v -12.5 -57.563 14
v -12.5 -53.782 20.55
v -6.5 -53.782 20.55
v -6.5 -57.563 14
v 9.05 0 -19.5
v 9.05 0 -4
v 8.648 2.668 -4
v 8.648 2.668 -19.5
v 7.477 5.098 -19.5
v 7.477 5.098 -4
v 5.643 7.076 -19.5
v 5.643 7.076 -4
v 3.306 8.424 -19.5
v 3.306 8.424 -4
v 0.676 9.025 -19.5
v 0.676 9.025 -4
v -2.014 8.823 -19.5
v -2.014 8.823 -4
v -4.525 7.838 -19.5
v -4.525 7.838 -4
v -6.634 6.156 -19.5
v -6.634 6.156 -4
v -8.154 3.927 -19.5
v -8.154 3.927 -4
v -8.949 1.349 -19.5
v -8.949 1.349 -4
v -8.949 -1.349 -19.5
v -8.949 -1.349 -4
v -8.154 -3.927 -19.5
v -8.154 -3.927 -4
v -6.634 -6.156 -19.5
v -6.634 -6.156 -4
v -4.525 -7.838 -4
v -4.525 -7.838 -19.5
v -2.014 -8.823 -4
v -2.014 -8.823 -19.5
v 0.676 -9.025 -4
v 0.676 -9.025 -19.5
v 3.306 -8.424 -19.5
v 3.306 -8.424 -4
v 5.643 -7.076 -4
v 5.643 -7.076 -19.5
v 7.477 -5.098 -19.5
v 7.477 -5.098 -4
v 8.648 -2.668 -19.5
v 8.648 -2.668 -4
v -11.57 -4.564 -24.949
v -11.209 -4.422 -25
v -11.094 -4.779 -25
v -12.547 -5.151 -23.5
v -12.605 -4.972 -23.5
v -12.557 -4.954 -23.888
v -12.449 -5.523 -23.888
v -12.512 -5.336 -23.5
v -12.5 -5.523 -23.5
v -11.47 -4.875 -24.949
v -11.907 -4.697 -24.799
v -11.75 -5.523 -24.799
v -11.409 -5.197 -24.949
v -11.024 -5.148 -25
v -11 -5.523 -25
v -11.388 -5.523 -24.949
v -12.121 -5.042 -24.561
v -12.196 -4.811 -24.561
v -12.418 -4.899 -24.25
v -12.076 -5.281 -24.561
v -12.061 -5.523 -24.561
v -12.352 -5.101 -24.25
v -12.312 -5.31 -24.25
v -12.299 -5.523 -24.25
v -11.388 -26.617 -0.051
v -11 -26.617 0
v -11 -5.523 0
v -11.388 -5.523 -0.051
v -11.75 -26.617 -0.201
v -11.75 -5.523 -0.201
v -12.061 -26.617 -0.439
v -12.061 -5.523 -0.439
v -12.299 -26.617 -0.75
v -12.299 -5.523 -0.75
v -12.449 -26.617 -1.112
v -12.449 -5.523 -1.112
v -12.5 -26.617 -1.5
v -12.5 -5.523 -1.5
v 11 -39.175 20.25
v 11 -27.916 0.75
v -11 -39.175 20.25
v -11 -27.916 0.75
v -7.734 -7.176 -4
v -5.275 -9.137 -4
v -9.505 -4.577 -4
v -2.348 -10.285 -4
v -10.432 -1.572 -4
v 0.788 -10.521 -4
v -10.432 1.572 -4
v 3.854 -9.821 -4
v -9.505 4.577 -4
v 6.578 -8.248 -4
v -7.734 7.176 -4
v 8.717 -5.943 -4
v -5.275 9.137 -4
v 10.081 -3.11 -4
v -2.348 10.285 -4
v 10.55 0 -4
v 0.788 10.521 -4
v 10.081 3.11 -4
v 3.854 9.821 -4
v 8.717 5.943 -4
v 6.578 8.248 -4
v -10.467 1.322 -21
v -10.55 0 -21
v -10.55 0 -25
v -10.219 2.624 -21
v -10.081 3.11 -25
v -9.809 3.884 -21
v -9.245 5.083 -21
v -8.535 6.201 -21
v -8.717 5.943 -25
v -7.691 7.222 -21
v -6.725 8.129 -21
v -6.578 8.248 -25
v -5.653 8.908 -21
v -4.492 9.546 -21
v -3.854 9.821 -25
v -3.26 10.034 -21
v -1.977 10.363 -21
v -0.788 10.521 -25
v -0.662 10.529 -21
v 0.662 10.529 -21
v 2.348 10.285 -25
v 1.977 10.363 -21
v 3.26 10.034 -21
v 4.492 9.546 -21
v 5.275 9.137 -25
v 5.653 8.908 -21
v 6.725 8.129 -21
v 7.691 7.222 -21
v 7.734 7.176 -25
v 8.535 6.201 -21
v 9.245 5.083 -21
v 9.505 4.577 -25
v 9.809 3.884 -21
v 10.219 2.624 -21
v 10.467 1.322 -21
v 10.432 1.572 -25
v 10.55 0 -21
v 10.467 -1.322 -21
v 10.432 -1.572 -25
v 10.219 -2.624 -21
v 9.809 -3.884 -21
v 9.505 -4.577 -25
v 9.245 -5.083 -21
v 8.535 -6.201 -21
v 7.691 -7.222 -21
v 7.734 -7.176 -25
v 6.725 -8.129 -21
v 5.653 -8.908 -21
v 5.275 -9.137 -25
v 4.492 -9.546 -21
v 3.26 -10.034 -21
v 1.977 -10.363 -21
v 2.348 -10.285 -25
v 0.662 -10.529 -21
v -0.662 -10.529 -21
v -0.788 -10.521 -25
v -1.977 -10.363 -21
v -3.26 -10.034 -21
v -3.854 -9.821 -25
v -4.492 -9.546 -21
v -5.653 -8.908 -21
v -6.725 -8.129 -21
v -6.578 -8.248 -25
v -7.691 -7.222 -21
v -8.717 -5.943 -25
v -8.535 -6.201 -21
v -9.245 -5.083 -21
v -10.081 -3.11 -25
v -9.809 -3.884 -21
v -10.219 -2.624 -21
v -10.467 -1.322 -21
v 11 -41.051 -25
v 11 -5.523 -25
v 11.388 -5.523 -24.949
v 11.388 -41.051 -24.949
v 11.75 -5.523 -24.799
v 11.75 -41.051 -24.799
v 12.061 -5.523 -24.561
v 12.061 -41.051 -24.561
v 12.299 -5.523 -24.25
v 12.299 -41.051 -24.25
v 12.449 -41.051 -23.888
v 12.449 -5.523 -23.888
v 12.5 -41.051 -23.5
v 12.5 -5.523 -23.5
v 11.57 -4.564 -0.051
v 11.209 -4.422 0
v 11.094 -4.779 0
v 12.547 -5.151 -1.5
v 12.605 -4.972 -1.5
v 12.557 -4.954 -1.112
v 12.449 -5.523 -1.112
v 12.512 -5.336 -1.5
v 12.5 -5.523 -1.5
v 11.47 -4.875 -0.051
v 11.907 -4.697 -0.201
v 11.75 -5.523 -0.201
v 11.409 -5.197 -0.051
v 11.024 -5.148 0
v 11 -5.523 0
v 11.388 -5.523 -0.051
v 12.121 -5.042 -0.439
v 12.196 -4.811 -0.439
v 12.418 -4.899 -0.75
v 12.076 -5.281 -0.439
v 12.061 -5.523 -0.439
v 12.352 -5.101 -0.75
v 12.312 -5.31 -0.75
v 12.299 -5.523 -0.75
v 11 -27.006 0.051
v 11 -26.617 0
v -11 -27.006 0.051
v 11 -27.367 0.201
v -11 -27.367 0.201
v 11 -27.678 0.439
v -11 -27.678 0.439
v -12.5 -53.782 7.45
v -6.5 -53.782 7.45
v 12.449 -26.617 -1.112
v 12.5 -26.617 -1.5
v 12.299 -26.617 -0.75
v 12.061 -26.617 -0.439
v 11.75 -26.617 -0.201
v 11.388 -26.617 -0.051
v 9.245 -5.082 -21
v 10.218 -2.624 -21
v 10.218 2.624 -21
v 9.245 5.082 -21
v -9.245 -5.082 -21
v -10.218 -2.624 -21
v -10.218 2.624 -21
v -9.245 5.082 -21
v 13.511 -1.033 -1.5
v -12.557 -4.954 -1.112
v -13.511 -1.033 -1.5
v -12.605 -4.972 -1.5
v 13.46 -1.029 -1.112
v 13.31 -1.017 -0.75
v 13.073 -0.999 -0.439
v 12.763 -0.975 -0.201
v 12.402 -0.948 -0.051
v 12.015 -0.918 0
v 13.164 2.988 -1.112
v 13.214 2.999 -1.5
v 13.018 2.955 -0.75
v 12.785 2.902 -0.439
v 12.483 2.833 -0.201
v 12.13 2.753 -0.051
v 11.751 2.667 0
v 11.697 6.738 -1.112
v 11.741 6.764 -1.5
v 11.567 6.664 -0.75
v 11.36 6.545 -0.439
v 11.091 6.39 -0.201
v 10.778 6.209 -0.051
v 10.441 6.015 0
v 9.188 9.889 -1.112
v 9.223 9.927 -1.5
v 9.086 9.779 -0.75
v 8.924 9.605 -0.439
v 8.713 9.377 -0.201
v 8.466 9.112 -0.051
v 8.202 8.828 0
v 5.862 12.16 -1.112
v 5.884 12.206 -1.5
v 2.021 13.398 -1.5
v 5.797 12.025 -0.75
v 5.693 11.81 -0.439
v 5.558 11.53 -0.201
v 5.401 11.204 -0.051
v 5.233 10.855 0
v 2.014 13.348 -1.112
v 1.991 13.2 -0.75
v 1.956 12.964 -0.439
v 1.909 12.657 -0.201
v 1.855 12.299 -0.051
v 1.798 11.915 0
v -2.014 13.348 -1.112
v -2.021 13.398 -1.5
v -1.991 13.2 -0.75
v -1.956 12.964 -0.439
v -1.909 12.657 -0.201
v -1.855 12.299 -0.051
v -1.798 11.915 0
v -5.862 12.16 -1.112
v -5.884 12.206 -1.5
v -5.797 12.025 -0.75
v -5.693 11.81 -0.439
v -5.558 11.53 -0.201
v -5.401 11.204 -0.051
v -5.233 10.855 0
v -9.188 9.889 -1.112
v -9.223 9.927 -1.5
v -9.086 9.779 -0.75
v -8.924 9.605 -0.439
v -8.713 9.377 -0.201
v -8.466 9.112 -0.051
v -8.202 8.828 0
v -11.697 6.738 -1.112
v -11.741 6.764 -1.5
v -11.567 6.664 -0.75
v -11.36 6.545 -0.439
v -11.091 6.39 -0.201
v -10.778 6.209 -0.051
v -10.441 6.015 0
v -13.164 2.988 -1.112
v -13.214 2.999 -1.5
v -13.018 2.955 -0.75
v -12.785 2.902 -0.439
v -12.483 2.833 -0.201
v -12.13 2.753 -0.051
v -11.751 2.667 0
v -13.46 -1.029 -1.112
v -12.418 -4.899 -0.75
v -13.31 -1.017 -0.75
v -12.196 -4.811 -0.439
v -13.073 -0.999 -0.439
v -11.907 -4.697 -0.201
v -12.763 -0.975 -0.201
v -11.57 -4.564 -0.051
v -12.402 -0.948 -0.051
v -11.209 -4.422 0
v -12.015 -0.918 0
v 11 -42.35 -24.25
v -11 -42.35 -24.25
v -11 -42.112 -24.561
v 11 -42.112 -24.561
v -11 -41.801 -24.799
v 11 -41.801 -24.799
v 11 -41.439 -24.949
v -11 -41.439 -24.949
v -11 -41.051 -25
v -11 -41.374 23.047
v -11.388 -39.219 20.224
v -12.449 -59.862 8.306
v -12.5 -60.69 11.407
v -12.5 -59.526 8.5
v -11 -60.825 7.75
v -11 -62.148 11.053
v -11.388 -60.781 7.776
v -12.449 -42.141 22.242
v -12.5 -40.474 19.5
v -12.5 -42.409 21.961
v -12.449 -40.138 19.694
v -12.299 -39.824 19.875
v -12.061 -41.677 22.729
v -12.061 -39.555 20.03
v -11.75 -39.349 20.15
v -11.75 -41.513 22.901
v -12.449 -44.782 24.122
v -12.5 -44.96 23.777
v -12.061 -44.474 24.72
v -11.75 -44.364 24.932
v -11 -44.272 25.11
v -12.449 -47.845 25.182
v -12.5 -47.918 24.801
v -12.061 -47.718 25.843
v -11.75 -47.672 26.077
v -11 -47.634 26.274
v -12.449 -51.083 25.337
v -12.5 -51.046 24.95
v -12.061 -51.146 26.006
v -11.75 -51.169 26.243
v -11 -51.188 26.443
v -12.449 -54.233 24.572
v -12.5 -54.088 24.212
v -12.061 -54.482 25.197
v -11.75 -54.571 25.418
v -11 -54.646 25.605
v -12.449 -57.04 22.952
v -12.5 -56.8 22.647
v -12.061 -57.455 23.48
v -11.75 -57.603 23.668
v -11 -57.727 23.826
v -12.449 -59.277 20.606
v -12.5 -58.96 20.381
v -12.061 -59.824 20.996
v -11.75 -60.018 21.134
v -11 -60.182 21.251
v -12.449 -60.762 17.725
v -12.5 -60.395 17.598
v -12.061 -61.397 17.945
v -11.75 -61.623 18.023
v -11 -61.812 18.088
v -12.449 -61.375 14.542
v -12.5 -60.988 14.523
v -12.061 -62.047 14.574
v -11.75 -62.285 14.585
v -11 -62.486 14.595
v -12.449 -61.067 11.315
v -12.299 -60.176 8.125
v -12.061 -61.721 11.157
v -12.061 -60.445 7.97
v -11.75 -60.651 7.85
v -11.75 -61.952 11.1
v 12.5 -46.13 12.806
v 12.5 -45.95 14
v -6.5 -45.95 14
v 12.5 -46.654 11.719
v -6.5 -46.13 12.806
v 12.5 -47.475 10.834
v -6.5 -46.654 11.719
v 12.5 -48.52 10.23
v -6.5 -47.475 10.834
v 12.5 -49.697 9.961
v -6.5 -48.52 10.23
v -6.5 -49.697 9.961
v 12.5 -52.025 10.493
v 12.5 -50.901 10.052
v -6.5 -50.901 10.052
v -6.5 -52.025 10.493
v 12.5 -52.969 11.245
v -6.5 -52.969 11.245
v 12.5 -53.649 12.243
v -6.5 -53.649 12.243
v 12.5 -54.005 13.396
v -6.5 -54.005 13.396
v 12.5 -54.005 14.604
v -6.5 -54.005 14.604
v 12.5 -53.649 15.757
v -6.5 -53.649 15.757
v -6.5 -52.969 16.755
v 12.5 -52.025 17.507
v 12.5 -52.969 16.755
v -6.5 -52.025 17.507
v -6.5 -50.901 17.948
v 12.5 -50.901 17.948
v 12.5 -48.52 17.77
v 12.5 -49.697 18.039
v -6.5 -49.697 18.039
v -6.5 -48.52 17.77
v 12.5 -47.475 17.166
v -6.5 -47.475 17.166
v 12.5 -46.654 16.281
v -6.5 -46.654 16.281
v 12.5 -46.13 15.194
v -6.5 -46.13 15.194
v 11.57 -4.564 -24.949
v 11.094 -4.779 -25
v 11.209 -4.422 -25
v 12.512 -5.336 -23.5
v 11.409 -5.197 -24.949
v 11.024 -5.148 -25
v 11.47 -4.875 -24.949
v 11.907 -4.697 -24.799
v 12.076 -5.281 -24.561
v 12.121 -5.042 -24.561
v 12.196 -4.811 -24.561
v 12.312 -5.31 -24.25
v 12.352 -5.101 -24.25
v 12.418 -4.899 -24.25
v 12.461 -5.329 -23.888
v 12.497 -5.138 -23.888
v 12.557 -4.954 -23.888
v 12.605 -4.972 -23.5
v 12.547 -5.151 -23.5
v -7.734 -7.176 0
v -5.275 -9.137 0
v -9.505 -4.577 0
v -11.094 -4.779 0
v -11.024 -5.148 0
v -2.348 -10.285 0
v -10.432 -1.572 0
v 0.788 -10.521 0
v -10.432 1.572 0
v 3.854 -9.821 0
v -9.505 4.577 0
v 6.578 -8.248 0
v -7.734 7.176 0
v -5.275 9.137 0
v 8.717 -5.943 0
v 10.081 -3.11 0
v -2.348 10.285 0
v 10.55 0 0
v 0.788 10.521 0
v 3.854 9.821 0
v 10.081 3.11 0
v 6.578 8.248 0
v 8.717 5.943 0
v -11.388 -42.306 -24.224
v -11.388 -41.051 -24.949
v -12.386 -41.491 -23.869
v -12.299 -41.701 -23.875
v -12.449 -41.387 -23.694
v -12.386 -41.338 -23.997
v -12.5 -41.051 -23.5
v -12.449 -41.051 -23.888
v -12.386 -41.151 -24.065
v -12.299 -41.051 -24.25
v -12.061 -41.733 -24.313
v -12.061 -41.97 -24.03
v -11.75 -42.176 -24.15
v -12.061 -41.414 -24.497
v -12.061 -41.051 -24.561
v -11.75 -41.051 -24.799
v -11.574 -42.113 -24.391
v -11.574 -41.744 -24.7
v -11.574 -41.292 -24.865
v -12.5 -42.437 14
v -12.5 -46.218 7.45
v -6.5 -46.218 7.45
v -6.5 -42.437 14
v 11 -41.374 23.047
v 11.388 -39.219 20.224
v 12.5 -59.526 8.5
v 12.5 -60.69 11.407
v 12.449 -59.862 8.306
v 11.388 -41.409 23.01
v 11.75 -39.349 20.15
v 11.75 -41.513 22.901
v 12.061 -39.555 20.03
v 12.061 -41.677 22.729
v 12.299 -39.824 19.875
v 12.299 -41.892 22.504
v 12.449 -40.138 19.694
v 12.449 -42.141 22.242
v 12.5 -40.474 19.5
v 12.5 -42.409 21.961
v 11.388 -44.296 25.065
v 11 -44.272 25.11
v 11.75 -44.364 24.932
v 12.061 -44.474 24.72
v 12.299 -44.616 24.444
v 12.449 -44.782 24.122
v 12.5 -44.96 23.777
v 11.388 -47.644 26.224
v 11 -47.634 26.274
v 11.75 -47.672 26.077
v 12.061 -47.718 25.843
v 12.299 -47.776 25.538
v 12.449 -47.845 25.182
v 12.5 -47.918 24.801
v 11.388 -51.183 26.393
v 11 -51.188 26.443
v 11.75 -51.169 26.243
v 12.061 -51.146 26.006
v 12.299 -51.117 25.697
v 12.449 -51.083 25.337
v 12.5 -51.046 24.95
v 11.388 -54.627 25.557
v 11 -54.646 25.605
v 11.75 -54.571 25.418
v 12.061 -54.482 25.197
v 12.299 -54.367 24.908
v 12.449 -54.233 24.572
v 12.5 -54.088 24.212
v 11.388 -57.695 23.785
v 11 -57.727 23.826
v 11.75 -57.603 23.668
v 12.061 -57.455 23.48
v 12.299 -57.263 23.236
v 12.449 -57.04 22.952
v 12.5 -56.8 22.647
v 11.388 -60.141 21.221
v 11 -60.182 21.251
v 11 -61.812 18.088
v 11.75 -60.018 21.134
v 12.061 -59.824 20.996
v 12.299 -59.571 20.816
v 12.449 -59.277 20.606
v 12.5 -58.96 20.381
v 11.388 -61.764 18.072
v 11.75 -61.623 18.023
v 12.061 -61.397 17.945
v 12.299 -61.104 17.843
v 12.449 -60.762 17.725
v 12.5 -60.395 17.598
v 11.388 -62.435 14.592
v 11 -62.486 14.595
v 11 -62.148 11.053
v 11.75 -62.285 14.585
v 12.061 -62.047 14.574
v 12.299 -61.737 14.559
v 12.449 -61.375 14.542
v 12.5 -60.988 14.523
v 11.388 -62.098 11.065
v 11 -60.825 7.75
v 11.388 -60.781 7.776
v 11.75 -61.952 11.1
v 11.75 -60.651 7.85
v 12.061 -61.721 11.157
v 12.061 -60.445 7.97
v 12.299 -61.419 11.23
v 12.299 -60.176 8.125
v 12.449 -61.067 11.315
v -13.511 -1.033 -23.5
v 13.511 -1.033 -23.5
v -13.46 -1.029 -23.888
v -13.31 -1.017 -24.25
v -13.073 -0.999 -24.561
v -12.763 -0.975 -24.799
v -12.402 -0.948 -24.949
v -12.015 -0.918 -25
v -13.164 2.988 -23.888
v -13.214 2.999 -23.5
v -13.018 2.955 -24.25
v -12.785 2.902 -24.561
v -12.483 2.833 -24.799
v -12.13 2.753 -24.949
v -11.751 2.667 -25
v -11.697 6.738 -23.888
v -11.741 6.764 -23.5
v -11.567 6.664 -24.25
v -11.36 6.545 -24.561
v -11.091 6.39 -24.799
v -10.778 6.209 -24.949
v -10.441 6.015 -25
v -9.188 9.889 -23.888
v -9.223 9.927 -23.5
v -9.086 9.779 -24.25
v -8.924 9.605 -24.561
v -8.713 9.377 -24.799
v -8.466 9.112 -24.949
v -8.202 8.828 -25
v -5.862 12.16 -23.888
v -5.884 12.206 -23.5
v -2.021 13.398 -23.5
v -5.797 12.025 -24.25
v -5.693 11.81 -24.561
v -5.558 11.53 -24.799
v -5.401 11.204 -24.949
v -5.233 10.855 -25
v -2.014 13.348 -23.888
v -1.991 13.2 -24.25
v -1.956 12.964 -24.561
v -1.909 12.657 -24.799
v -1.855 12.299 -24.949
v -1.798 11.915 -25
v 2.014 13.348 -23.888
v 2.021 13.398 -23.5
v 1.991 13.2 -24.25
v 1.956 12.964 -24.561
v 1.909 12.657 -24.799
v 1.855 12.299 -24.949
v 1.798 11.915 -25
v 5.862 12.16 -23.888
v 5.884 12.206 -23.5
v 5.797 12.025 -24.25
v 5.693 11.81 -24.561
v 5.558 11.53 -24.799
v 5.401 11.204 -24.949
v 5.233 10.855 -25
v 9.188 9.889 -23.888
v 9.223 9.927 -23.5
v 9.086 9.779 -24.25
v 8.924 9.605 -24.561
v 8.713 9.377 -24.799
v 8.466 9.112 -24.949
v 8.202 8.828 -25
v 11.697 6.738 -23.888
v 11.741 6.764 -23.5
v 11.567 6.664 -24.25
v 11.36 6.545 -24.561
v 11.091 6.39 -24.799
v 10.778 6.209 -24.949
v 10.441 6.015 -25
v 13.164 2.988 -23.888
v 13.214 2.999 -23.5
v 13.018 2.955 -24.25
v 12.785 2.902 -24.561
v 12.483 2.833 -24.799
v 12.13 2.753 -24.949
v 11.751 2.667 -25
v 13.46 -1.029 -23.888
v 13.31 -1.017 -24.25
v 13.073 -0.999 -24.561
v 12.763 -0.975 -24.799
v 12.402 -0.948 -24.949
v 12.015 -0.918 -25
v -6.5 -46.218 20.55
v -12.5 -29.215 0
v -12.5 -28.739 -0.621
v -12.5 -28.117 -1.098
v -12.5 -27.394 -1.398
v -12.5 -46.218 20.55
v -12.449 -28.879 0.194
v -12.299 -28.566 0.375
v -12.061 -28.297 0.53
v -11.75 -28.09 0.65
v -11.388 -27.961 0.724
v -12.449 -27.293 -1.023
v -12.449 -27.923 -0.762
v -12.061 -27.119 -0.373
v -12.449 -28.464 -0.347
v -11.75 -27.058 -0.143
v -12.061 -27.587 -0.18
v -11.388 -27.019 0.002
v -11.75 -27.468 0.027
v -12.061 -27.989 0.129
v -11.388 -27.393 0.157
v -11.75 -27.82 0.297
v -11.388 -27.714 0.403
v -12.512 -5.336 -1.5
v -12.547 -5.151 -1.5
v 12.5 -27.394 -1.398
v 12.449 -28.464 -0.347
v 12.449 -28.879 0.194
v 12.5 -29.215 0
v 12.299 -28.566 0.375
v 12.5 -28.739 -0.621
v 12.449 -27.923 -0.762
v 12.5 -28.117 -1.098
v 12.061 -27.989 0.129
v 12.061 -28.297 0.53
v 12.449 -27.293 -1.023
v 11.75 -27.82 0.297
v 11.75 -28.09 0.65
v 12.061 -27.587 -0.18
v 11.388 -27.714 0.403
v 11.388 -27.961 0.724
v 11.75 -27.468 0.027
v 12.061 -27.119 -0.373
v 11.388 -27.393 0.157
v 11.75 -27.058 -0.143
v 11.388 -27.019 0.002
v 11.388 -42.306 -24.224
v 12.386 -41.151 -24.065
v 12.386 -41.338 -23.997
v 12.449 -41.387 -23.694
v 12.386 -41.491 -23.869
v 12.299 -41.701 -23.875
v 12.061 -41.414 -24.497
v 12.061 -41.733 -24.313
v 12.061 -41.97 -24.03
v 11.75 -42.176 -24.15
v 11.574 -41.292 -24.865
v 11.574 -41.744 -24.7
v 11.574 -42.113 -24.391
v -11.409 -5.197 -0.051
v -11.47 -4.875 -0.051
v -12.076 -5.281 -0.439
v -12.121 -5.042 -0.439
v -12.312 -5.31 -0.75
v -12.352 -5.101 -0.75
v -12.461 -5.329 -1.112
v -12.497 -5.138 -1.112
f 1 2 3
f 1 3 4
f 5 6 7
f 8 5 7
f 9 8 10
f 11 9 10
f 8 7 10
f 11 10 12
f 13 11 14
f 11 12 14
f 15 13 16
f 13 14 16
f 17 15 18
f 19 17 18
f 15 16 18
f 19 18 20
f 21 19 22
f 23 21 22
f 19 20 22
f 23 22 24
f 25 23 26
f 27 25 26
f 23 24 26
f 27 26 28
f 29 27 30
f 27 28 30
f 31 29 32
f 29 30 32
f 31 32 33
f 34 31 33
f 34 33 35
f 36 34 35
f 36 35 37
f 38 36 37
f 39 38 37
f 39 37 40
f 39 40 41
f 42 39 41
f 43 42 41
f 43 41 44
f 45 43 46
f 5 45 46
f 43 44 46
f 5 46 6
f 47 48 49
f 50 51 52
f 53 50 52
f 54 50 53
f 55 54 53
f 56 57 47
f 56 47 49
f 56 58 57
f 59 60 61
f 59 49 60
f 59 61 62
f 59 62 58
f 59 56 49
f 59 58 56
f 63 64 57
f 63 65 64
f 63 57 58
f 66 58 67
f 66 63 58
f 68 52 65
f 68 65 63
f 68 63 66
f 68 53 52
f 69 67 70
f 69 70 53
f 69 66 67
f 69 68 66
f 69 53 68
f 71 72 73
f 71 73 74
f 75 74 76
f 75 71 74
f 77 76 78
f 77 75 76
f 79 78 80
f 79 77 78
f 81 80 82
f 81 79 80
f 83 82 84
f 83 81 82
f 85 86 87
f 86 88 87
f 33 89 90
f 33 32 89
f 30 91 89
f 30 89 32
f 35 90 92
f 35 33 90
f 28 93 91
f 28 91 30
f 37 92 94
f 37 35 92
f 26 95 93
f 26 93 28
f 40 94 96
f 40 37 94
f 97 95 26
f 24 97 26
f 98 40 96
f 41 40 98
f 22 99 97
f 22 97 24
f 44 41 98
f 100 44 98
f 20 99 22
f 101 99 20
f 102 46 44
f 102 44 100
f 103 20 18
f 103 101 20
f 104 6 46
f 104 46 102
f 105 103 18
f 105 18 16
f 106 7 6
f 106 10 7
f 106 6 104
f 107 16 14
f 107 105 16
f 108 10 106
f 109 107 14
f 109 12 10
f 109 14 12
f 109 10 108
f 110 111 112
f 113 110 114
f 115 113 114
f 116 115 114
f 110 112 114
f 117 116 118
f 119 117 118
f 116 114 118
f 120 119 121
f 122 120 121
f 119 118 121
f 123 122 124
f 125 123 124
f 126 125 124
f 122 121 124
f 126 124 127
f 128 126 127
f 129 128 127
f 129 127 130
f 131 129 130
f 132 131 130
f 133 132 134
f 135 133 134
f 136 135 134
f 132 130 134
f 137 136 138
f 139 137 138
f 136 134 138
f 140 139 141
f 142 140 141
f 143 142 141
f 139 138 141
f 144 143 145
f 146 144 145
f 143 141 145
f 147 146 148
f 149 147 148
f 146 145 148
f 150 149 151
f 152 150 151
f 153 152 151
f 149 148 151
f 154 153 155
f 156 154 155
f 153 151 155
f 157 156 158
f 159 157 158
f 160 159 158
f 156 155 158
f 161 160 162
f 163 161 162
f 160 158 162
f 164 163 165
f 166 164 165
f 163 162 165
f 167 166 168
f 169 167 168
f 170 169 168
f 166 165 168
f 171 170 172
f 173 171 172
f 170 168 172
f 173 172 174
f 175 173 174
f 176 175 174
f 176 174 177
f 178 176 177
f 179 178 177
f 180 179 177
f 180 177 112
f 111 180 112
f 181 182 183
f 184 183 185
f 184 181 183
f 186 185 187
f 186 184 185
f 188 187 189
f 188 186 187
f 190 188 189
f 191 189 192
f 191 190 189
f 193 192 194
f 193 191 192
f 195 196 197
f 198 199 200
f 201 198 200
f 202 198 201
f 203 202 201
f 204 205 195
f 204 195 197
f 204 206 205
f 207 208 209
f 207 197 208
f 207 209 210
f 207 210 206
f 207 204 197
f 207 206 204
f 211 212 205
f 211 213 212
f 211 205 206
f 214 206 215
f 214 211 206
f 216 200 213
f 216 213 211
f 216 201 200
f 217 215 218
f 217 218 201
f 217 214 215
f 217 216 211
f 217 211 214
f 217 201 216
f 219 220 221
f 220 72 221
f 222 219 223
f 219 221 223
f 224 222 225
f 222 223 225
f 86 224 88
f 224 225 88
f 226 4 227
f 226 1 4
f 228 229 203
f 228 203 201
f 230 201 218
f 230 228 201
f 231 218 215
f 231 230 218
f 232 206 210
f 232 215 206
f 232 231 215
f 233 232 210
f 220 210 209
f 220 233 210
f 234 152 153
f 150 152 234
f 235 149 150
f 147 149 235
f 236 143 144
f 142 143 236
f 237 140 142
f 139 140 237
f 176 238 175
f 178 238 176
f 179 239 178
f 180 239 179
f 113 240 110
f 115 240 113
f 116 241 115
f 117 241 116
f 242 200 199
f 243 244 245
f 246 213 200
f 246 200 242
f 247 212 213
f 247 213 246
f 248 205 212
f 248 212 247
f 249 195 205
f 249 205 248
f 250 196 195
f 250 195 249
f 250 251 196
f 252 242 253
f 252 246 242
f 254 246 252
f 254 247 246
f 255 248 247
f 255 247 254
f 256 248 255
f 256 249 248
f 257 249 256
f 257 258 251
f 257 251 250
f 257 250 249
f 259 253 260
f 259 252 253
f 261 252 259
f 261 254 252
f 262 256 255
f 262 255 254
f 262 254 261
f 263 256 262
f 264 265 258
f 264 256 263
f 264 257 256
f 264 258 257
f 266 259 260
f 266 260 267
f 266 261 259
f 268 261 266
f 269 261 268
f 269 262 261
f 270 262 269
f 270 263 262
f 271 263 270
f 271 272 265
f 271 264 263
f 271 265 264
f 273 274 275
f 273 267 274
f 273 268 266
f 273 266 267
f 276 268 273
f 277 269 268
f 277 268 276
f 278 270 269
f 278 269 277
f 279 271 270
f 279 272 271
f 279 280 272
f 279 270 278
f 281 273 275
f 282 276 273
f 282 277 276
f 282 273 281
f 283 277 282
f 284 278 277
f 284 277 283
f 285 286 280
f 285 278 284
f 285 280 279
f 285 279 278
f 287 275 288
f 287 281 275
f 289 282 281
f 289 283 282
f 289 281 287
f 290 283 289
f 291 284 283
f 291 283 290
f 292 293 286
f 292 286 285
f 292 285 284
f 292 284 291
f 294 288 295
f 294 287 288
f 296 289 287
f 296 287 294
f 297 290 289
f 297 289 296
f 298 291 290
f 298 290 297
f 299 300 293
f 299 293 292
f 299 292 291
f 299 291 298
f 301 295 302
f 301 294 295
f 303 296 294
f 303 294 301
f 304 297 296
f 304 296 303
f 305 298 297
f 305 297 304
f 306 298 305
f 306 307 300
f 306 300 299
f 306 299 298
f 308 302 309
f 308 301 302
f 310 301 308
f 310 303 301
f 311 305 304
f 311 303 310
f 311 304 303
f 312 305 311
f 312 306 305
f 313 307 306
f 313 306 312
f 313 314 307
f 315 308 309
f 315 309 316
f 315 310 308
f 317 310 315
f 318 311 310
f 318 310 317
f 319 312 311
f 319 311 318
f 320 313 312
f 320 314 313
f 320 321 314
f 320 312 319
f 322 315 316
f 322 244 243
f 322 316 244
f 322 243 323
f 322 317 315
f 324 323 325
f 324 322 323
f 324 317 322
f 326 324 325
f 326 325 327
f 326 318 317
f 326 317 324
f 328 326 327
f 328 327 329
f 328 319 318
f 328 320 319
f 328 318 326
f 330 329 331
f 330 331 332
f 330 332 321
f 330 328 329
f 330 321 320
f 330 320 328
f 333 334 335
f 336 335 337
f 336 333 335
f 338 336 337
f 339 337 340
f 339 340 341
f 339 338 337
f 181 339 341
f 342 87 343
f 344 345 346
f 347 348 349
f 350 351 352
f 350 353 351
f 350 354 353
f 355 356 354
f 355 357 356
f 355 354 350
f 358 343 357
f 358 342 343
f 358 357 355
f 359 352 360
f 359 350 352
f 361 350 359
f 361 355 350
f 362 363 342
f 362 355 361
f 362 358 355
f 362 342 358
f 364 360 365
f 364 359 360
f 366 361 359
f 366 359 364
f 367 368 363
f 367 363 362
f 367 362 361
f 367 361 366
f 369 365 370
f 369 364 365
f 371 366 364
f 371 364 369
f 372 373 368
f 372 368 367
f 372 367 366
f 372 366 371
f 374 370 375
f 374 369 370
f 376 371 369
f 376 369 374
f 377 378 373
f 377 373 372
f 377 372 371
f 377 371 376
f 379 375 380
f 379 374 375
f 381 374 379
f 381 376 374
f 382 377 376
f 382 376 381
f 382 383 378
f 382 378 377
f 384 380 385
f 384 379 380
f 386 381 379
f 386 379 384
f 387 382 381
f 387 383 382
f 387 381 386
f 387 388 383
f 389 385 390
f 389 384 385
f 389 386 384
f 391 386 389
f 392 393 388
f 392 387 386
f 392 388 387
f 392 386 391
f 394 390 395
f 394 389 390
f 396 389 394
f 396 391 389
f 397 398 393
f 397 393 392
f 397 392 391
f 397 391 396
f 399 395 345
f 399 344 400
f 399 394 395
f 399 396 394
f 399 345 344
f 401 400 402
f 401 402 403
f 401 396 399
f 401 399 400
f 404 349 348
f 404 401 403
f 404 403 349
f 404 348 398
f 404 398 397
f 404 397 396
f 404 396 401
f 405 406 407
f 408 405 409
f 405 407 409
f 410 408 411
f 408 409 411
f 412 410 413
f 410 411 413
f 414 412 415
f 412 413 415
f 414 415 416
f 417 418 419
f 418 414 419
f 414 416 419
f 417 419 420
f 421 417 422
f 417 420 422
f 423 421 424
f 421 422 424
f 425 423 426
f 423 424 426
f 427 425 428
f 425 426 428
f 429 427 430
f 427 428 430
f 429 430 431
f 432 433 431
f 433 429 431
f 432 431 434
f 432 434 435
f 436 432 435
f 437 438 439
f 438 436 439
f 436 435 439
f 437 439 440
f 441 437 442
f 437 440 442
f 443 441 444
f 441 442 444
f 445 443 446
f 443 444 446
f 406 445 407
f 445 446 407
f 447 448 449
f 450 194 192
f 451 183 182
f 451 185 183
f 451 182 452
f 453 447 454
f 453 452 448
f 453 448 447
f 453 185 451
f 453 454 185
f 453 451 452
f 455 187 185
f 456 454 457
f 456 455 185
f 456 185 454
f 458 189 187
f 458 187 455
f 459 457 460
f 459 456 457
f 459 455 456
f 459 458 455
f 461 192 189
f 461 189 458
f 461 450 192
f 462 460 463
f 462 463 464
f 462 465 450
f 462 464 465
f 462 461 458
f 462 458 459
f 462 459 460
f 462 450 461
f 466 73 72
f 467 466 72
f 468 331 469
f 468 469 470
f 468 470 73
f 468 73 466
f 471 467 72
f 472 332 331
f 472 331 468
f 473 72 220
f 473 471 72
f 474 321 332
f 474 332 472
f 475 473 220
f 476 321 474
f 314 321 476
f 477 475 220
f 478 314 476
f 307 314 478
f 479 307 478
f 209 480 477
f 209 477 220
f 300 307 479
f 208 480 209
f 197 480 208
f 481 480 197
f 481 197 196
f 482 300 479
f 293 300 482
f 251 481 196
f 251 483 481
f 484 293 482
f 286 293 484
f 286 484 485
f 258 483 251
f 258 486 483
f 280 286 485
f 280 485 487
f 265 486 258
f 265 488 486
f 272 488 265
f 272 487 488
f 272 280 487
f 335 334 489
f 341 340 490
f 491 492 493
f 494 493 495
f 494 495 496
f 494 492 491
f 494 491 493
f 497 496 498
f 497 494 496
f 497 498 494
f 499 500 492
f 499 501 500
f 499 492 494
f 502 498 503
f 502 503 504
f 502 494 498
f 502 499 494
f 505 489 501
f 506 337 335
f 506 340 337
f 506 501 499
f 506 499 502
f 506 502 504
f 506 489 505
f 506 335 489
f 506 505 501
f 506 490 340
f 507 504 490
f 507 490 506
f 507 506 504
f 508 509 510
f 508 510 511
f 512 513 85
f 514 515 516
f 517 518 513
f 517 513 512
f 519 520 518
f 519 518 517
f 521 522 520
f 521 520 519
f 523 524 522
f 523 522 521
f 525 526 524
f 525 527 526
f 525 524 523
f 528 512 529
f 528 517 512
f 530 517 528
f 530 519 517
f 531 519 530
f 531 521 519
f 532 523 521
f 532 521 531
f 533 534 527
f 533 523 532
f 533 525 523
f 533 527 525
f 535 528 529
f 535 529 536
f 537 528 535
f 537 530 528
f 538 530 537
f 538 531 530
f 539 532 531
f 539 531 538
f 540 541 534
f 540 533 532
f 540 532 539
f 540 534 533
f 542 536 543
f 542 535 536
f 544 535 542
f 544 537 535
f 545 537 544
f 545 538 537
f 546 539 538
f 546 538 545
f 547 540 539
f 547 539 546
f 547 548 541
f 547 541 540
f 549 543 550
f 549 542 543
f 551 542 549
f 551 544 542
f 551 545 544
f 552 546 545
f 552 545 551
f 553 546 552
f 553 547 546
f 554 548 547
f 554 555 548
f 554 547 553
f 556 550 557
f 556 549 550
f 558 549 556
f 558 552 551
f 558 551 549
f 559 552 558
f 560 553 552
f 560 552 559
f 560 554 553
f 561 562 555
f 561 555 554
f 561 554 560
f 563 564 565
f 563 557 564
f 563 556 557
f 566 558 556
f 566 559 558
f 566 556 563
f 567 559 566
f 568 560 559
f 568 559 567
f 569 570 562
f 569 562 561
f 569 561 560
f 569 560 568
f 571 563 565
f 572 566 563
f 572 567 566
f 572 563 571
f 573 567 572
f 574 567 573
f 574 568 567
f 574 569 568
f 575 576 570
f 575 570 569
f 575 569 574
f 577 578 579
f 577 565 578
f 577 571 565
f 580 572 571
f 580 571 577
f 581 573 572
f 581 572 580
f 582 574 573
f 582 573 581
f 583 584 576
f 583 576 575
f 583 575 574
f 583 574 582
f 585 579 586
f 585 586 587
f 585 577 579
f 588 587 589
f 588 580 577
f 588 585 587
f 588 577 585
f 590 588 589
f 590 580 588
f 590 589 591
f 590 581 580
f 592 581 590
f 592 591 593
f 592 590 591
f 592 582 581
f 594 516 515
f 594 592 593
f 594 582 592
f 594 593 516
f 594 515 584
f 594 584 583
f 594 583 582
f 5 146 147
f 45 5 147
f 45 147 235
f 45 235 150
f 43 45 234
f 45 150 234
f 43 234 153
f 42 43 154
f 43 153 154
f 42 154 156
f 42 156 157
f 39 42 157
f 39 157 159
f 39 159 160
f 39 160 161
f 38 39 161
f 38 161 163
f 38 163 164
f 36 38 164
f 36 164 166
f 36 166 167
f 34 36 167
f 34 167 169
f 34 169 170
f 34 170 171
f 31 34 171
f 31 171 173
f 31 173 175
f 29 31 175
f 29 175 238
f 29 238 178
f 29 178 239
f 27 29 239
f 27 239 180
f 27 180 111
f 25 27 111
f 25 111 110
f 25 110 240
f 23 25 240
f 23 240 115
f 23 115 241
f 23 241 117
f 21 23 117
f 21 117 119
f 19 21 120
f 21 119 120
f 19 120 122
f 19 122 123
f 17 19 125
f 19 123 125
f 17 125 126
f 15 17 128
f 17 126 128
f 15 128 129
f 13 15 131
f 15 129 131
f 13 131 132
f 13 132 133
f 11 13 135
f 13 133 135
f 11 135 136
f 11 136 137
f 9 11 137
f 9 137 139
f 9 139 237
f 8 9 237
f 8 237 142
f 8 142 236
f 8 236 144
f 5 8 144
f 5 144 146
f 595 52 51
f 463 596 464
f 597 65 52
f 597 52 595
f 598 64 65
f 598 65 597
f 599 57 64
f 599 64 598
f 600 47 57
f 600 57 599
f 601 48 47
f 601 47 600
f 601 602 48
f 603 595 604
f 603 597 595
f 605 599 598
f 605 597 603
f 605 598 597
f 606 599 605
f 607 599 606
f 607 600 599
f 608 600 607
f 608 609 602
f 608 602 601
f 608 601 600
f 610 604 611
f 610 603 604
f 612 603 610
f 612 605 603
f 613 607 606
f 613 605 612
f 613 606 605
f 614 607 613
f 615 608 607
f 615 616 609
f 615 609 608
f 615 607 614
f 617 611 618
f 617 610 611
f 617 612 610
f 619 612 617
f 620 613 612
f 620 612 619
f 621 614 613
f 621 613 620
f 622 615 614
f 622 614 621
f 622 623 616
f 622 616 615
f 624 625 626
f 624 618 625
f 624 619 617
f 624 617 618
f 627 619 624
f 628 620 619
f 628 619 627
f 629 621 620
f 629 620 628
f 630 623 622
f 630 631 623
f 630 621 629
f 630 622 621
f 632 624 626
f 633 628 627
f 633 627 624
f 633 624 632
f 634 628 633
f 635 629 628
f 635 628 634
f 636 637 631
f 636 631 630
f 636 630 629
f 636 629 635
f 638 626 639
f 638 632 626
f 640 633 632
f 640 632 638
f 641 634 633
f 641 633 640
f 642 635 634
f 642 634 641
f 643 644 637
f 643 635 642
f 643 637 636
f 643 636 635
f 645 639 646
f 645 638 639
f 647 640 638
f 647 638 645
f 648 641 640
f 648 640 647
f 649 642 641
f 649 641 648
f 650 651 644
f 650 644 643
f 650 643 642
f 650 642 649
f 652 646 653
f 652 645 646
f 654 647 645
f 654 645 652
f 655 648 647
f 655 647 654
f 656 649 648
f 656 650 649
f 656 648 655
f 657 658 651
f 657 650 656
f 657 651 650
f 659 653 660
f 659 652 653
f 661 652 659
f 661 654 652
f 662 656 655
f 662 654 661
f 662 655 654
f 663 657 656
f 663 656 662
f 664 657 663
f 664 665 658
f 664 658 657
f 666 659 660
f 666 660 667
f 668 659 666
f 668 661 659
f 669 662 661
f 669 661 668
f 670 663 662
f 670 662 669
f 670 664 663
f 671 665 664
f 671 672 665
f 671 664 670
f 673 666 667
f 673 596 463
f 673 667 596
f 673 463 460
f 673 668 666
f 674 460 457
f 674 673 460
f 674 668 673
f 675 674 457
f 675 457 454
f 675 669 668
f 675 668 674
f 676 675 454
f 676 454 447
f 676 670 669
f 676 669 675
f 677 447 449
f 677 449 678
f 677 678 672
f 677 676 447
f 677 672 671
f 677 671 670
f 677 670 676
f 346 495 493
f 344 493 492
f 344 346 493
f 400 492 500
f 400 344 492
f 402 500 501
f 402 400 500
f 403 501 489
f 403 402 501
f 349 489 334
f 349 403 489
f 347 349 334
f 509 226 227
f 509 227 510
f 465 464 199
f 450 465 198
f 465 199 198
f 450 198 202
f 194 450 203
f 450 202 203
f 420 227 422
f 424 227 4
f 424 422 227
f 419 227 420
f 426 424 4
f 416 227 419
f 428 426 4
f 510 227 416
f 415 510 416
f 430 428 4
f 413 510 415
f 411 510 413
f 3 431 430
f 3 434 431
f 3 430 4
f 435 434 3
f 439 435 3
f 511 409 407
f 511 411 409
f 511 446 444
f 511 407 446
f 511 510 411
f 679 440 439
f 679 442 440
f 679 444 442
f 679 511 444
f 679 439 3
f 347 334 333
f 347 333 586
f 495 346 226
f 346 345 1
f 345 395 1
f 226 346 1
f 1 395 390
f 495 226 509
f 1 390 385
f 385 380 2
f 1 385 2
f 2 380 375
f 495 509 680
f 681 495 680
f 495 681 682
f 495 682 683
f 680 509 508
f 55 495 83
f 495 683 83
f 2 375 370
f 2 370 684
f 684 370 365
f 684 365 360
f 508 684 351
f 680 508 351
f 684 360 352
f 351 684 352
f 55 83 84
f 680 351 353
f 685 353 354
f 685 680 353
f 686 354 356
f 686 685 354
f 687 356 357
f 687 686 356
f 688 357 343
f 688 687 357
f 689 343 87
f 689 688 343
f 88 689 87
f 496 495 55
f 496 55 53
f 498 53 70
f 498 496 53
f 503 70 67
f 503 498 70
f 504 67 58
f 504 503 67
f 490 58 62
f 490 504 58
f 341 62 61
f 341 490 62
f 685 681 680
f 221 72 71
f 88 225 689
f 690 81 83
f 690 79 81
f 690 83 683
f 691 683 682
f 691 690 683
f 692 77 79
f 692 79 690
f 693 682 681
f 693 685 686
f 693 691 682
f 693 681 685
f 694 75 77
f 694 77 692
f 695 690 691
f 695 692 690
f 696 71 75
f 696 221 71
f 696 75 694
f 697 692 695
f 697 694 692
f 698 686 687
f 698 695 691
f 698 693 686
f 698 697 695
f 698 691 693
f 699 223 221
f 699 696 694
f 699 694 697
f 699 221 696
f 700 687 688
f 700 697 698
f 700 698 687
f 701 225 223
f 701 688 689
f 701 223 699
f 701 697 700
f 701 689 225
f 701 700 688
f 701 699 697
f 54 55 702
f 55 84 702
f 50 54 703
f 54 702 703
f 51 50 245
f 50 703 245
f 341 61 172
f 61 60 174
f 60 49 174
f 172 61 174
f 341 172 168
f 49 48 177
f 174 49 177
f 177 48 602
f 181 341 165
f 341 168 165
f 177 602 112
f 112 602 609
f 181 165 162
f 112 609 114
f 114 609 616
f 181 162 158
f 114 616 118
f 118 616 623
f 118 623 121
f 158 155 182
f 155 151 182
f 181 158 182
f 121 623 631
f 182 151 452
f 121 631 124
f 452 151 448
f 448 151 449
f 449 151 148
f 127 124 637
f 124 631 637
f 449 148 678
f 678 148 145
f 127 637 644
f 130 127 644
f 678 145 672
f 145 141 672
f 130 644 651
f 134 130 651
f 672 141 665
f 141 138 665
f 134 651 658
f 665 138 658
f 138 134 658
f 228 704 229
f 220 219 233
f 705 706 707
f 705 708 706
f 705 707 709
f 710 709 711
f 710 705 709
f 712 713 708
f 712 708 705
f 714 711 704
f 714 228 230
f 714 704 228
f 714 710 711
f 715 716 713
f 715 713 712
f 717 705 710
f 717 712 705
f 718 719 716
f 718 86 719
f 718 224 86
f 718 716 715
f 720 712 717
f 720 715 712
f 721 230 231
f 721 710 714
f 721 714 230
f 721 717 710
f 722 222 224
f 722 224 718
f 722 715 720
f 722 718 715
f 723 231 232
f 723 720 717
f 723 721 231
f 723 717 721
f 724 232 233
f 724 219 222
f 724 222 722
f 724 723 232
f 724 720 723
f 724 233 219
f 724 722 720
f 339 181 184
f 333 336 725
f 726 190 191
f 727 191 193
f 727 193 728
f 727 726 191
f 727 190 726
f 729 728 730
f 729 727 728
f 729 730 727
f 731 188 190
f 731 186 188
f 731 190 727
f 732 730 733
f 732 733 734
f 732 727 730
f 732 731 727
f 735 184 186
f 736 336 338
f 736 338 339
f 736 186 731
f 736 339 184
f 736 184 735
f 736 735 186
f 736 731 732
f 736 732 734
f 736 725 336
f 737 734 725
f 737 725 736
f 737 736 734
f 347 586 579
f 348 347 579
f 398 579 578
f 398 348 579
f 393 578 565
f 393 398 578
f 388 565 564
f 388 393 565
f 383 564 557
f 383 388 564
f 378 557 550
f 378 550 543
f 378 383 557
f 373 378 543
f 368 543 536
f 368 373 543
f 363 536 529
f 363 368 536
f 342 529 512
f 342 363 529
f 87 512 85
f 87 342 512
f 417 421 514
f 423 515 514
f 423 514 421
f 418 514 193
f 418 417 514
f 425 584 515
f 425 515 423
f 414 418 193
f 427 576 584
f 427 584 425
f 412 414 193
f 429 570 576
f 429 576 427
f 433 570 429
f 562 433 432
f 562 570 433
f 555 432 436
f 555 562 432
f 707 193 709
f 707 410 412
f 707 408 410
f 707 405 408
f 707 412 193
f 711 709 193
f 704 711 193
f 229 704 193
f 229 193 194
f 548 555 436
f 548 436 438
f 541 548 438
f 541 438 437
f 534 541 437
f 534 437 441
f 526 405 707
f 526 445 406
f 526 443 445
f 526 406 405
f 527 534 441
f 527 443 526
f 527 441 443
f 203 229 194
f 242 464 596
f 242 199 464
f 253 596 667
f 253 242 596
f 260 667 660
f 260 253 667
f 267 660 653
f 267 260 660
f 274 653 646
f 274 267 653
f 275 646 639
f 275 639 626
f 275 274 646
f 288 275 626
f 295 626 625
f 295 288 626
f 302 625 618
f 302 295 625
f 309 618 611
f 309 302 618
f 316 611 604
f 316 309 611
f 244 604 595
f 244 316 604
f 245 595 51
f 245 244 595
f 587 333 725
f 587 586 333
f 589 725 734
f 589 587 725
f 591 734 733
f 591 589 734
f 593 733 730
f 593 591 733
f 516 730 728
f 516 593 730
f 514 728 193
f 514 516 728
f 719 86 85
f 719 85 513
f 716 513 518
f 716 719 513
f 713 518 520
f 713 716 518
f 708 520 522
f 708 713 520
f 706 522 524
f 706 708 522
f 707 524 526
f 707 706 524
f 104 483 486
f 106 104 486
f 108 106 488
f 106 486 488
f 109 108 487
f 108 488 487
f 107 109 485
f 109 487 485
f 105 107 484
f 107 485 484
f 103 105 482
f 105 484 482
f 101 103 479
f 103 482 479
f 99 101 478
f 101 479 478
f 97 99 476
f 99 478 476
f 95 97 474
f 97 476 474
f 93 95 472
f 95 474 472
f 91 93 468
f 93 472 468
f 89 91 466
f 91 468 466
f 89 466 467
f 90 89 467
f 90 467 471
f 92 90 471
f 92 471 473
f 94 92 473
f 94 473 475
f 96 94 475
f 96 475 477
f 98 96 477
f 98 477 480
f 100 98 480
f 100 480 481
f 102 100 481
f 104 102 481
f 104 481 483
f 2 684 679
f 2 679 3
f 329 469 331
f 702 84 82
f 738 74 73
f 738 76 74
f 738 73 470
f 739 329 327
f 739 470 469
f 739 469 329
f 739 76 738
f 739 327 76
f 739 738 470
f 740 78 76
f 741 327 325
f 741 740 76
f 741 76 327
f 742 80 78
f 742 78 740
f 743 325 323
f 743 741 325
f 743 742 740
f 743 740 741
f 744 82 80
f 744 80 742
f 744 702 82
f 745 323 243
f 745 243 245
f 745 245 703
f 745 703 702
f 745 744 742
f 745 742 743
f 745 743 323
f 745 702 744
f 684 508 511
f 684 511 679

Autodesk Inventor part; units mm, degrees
ref_plane "YZ Plane" through (0, 0, 0) normal (1, 0, 0) x (0, 1, 0)
ref_plane "XZ Plane" through (0, 0, 0) normal (0, 1, 0) x (-1, 0, 0)
ref_plane "XY Plane" through (0, 0, 0) normal (0, 0, 1) x (1, 0, 0)
sketch "Sketch1" plane through (0, 0, 0) normal (1, 0, 0) x (0, 1, 0)
  circle A0 centre (-50, 14) radius 4.05
  arc A1 (-39.1747, 20.25) -> (-60.8253, 7.75) centre (-50, 14) ccw
  line L0 (0, 0) -> (0, -25)
  line L1 (0, -25) -> (-41.9171, -25)
  line L2 (-41.9171, -25) -> (-60.8253, 7.75)
  line L3 (0, 0) -> (-27.4833, 0)
  line L4 (-27.4833, 0) -> (-39.1747, 20.25)
  dimension "d0" = 8.1
  dimension "d2" = 50
  dimension "d3" = 14
  dimension "d4" = 25
  dimension "d6" = 25
  dimension "d40" = 120
extrude "Extrusion1" add sketch "Sketch1" along normal mid plane 25
sketch "Sketch2" plane through (-12.5, -27.4833, 0) normal (0, 0, 1) x (1, 0, 0)
  circle A0 centre (12.5, 27.4833) radius 12.5
extrude "Extrusion2" add sketch "Sketch2" against normal up to surface (25 mm away)
sketch "Sketch12" plane through (-12.5, 0, 0) normal (-1, 0, 0) x (0, 0, 1)
  circle A0 centre (14, -50) radius 4.05 projected
  arc A1 (7.75, -60.8253) -> (20.25, -39.1747) centre (14, -50) ccw projected
  line L0 (14, -42.4367) -> (20.55, -46.2184)
  line L1 (20.55, -46.2184) -> (20.55, -53.7816)
  line L2 (20.55, -53.7816) -> (14, -57.5633)
  line L3 (14, -57.5633) -> (7.45, -53.7816)
  line L4 (7.45, -53.7816) -> (7.45, -46.2184)
  line L5 (7.45, -46.2184) -> (14, -42.4367)
  dimension "d56" = 13.1
extrude "Extrusion12" cut sketch "Sketch12" against normal blind 6
sketch "Sketch13" plane through (-12.5, -27.4833, 0) normal (0, 0, 1) x (1, 0, 0)
  arc A0 (25, 27.4833) -> (0, 27.4833) centre (12.5, 27.4833) ccw projected
  circle A1 centre (12.5, 27.4833) radius 9.05
  dimension "d59" = 18.1
extrude "Extrusion13" cut sketch "Sketch13" against normal through all
sketch "Sketch14" plane through (-12.5, -27.4833, 0) normal (0, 0, 1) x (1, 0, 0)
  circle A0 centre (12.5, 27.4833) radius 9.05 projected
  arc A1 (25, 27.4833) -> (0, 27.4833) centre (12.5, 27.4833) ccw projected
  circle A2 centre (12.5, 27.4833) radius 10.55
  dimension "d63" = 21.1
extrude "Extrusion14" cut sketch "Sketch14" against normal blind 4
sketch "Sketch15" plane through (12.5, -41.9171, -25) normal (0, 0, -1) x (-1, 0, 0)
  circle A0 centre (12.5, 41.9171) radius 9.05 projected
  arc A1 (25, 41.9171) -> (0, 41.9171) centre (12.5, 41.9171) ccw projected
  circle A2 centre (12.5, 41.9171) radius 10.55
  dimension "d67" = 21.1
extrude "Extrusion15" cut sketch "Sketch15" against normal blind 4
chamfer "Chamfer4" distance 1.5 angle 45 1 edges at (-9.05, 0, -21)
sketch "Sketch16" plane through (-12.5, -27.4833, 0) normal (0, 0, 1) x (1, 0, 0)
  circle A0 centre (12.5, 27.4833) radius 10.55 projected
  arc A1 (25, 27.4833) -> (0, 27.4833) centre (12.5, 27.4833) ccw projected
  circle A2 centre (12.5, 27.4833) radius 13.55
  dimension "d76" = 3
extrude "Extrusion16" add sketch "Sketch16" against normal up to surface (25 mm away)
fillet "Fillet2" radius 1.5 16 edges at (0, -41.9171, -25) (12.5, -51.3712, -8.625) (-12.5, -51.3712, -8.625) (12.5, -56.25, 24.8253) (12.5, -33.329, 10.125) (-12.5, -56.25, 24.8253) (-12.5, -33.329, 10.125) (12.5, -23.5735, -25) (-12.5, -23.5735, -25) (0, 13.55, -25) (-12.5, -5.23, -12.5) (0, 13.55, 0) (12.5, -5.23, -12.5) (-12.5, -16.3567, 0) (0, -27.4833, 0) (12.5, -16.3567, 0)
properties part number "hub top"
